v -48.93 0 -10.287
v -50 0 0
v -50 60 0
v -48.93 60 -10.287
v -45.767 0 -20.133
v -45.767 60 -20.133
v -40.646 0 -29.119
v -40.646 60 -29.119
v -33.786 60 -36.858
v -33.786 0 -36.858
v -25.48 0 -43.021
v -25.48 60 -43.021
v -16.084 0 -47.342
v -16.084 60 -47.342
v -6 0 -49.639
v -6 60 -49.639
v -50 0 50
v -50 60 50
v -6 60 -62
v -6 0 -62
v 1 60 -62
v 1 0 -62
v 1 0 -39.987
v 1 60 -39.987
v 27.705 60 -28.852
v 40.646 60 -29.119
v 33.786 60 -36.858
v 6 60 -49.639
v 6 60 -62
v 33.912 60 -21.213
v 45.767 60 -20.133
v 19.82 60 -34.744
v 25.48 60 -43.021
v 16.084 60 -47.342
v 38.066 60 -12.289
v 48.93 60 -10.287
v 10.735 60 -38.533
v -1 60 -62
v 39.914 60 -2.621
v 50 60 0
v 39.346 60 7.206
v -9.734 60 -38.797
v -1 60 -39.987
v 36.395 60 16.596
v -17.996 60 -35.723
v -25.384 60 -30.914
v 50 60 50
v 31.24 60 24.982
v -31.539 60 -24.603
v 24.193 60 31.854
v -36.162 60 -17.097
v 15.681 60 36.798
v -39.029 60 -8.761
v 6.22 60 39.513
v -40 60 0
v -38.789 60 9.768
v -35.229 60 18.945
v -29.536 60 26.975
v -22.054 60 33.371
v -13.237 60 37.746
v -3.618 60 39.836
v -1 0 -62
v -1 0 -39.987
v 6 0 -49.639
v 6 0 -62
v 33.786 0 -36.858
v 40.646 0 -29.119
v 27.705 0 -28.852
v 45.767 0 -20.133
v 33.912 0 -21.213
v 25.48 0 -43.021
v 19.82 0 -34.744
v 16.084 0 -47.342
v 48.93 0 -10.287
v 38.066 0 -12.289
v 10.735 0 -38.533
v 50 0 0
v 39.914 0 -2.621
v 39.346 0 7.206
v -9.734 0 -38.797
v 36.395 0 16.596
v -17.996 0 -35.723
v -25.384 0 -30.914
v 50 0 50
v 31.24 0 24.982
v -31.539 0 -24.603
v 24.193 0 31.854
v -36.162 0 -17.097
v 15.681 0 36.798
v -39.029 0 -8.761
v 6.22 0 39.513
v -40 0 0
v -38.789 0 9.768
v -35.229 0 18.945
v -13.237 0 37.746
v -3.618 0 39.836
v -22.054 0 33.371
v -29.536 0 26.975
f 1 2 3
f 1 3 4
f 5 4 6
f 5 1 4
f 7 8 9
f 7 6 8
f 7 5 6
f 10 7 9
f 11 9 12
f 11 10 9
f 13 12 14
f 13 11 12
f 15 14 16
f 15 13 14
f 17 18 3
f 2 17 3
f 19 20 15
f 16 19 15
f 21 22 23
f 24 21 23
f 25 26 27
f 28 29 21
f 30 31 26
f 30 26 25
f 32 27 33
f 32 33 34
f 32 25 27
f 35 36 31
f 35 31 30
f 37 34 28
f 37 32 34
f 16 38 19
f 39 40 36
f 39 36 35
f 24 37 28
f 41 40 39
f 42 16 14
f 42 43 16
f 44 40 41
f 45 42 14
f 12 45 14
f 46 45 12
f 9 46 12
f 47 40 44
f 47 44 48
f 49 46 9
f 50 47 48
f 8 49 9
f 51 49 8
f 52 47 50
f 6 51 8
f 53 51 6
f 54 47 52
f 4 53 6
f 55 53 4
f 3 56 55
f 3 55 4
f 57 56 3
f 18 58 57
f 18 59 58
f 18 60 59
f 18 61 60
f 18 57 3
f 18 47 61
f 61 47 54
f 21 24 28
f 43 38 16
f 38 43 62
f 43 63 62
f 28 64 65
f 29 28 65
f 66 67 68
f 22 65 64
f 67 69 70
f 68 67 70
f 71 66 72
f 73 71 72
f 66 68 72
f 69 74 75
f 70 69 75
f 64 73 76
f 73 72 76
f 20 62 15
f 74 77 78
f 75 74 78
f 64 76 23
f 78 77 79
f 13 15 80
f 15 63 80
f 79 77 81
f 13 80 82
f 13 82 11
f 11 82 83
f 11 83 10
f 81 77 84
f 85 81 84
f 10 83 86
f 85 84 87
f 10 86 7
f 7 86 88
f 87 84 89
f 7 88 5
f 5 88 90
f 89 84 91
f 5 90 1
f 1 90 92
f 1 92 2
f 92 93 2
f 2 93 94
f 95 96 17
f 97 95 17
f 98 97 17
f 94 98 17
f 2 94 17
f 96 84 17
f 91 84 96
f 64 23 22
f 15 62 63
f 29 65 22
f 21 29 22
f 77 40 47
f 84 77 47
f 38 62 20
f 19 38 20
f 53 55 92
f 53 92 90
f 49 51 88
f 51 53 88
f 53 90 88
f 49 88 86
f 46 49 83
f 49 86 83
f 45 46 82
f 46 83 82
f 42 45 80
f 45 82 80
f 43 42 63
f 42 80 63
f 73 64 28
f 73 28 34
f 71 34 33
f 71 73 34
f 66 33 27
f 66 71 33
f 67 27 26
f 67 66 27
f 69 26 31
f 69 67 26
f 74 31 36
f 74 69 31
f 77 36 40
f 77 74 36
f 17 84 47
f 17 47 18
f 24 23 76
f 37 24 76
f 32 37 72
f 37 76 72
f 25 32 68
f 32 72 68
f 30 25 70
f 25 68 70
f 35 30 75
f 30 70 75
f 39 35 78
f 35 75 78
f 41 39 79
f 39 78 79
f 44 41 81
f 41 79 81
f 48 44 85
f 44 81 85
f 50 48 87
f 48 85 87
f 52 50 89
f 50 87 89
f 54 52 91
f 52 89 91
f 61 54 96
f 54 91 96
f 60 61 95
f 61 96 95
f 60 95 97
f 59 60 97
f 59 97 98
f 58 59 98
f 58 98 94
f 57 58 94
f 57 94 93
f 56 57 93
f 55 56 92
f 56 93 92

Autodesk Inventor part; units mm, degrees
ref_plane "YZ Plane" through (0, 0, 0) normal (1, 0, 0) x (0, 1, 0)
ref_plane "XZ Plane" through (0, 0, 0) normal (0, 1, 0) x (-1, 0, 0)
ref_plane "XY Plane" through (0, 0, 0) normal (0, 0, 1) x (1, 0, 0)
sketch "Sketch1" plane through (0, 0, 0) normal (0, 1, 0) x (-1, 0, 0)
  circle A0 centre (0, 0) radius 50
  circle A1 centre (0, 0) radius 40
  line L0 (50, 0) -> (-50, 0)
  line L1 (-50, 0) -> (-50, 50)
  line L2 (-50, 50) -> (50, 50)
  line L3 (50, 50) -> (50, 0)
  line L4 (6, -46) -> (-6, -46)
  line L5 (-6, -46) -> (-6, -62)
  line L6 (-6, -62) -> (6, -62)
  line L7 (6, -62) -> (6, -46)
  line L8 (1, -64) -> (-1, -64)
  line L9 (-1, -64) -> (-1, -35)
  line L10 (-1, -35) -> (1, -35)
  line L11 (1, -35) -> (1, -64)
  point P0 (1, -39.9875)
  point P1 (1, -62)
  point P2 (6, -49.6387)
  point P3 (-6, -49.6387)
  point P4 (-1, -62)
  point P5 (-1, -39.9875)
  dimension "d0" = 100
extrude "Extrusion1" add sketch "Sketch1" along normal blind 60 contours L0 A1 A0 | A0 L7 L4 L11 A1 L0 | A0 L2 L3 | A0 L1 L2 | L7 L6 L11 A0 | A0 L11 L4 L7 | L0 A1 L9 L4 L5 A0 | L5 L4 L9 A0 | A0 L9 L6 L5
properties part number "MotorClamp"
